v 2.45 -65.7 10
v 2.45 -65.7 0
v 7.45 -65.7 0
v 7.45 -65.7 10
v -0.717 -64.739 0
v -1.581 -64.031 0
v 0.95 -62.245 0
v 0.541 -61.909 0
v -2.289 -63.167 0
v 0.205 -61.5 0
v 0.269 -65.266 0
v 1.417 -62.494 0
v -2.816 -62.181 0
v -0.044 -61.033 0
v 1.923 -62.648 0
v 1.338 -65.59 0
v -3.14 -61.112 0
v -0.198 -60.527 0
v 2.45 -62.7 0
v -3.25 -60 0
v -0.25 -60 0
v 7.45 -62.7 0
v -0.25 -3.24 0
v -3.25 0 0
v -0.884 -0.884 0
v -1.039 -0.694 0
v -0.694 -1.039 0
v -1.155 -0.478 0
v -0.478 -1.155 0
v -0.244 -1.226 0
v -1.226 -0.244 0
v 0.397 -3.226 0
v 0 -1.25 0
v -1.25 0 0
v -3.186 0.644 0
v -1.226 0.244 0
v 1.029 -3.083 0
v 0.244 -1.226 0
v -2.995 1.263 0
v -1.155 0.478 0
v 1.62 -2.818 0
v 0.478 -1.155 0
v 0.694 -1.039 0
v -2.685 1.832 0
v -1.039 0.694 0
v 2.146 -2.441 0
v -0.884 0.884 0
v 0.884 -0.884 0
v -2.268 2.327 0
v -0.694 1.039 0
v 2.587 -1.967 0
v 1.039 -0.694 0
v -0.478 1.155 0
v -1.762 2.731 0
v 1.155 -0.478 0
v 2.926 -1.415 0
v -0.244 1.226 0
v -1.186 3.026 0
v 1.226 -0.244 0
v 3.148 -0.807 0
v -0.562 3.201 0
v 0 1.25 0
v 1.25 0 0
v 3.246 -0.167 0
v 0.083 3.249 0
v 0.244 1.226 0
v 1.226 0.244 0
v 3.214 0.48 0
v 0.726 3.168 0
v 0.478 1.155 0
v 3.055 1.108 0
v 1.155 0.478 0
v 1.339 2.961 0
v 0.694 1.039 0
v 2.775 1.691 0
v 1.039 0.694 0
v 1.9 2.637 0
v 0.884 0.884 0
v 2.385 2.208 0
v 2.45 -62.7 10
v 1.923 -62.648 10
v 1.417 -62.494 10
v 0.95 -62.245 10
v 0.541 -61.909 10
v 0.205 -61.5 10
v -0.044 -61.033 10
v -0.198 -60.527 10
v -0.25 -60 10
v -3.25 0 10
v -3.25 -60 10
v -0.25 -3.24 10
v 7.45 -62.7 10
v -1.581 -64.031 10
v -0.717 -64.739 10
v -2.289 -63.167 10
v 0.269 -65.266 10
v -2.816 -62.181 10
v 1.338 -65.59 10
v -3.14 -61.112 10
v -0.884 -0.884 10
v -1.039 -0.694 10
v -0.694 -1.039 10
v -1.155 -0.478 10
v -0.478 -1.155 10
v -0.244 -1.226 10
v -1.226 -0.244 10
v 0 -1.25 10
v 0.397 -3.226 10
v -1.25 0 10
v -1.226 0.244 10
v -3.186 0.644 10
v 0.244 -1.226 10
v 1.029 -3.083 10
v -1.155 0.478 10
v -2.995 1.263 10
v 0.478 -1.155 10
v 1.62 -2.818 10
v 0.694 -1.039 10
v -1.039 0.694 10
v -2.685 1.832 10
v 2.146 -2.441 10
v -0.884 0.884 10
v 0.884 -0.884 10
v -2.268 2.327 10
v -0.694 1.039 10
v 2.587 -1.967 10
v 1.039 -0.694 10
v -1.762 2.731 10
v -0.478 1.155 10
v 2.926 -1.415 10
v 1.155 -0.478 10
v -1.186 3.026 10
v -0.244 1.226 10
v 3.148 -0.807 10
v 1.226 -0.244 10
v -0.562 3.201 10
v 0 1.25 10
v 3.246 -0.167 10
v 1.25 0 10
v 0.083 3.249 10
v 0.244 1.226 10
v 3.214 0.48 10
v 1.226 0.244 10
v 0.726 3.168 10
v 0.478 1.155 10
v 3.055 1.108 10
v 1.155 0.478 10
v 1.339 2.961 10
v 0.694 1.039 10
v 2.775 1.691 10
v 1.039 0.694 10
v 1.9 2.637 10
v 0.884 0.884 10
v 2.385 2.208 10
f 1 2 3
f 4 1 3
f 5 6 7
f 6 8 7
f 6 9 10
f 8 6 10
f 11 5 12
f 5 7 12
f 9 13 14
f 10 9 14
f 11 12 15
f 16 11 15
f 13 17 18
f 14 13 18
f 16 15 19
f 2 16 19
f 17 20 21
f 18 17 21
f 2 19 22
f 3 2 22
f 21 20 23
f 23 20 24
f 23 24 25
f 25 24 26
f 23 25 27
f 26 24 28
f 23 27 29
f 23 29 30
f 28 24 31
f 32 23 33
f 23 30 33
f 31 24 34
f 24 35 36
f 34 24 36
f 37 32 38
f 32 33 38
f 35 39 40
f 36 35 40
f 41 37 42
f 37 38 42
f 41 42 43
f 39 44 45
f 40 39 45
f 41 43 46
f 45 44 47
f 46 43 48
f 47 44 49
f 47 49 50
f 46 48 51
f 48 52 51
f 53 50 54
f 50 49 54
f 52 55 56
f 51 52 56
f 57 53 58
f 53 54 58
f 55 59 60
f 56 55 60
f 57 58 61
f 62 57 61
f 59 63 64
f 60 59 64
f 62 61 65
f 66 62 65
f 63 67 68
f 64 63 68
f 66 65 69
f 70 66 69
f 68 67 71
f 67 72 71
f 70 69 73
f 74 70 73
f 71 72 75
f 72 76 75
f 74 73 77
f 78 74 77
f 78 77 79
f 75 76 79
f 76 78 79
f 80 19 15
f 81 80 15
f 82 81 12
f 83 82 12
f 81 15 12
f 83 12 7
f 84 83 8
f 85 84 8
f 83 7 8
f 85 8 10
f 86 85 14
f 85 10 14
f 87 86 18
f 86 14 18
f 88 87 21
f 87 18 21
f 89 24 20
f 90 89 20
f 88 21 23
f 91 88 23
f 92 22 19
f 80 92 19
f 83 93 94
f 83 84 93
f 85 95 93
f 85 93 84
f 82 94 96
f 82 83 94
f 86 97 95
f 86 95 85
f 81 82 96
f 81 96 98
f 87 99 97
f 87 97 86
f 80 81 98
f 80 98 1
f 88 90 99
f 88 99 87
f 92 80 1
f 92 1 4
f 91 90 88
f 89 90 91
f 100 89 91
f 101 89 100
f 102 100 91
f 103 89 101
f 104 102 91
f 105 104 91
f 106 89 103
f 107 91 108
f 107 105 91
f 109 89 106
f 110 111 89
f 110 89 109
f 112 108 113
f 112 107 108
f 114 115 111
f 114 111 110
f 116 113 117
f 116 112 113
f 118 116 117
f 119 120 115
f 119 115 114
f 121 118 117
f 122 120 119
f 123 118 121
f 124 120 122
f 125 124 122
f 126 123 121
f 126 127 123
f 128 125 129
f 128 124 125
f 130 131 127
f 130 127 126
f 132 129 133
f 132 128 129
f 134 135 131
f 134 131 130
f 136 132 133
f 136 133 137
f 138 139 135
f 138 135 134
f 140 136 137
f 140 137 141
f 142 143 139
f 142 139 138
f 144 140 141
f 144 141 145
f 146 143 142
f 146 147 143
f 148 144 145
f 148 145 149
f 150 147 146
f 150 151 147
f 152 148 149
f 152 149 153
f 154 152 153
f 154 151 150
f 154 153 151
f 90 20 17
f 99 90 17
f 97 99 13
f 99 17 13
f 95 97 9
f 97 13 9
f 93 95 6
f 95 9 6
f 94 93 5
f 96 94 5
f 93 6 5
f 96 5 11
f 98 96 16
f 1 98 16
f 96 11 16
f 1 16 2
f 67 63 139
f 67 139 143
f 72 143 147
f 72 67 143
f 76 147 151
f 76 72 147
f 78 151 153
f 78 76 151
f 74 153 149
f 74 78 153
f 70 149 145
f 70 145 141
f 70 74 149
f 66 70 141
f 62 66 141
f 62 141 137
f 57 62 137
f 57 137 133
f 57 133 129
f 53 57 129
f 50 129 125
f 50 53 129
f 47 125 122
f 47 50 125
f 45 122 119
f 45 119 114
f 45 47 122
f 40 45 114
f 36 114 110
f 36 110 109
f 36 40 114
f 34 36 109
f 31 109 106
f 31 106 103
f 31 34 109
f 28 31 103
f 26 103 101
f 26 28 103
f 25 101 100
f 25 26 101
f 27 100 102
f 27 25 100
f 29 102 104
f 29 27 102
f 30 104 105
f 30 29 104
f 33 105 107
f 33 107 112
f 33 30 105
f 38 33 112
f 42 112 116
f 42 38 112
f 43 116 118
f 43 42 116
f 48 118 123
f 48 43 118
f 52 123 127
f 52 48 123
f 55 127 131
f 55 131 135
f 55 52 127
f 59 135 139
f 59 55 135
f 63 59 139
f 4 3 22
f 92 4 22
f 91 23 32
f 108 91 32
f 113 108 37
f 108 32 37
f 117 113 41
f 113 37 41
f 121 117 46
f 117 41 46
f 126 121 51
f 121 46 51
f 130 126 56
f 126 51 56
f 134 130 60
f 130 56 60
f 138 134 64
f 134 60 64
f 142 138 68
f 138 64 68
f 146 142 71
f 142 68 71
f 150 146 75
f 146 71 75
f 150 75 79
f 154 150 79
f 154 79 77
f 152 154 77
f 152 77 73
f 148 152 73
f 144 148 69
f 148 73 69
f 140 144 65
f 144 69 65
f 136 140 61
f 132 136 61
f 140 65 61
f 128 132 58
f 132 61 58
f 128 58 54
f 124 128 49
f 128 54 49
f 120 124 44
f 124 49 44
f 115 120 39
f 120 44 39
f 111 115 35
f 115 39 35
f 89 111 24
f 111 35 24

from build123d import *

# Parameters (mm, degrees)
SKETCH1_R           = 1.25
BOSS_EXTRUDE1_DEPTH = 10


with BuildPart() as part:
    # Sketch1 → Boss-Extrude1 (new body)
    with BuildSketch(Plane.XY):
        with BuildLine():
            Line((-3.25, 0), (-3.25, -60))
            ThreePointArc((-3.25, -60), (-1.580508653, -64.030508653), (2.45, -65.7))
            Line((2.45, -65.7), (7.45, -65.7))
            Line((7.45, -65.7), (7.45, -62.7))
            Line((7.45, -62.7), (2.45, -62.7))
            ThreePointArc((2.45, -62.7), (0.540811691, -61.909188309), (-0.25, -60))
            Line((-0.25, -60), (-0.25, -3.240370349))
            ThreePointArc((-0.25, -3.240370349), (2.384848004, 2.207940217), (-3.25, 0))
        make_face()
        Circle(SKETCH1_R, mode=Mode.SUBTRACT)
    extrude(amount=BOSS_EXTRUDE1_DEPTH)


solid = part.part
